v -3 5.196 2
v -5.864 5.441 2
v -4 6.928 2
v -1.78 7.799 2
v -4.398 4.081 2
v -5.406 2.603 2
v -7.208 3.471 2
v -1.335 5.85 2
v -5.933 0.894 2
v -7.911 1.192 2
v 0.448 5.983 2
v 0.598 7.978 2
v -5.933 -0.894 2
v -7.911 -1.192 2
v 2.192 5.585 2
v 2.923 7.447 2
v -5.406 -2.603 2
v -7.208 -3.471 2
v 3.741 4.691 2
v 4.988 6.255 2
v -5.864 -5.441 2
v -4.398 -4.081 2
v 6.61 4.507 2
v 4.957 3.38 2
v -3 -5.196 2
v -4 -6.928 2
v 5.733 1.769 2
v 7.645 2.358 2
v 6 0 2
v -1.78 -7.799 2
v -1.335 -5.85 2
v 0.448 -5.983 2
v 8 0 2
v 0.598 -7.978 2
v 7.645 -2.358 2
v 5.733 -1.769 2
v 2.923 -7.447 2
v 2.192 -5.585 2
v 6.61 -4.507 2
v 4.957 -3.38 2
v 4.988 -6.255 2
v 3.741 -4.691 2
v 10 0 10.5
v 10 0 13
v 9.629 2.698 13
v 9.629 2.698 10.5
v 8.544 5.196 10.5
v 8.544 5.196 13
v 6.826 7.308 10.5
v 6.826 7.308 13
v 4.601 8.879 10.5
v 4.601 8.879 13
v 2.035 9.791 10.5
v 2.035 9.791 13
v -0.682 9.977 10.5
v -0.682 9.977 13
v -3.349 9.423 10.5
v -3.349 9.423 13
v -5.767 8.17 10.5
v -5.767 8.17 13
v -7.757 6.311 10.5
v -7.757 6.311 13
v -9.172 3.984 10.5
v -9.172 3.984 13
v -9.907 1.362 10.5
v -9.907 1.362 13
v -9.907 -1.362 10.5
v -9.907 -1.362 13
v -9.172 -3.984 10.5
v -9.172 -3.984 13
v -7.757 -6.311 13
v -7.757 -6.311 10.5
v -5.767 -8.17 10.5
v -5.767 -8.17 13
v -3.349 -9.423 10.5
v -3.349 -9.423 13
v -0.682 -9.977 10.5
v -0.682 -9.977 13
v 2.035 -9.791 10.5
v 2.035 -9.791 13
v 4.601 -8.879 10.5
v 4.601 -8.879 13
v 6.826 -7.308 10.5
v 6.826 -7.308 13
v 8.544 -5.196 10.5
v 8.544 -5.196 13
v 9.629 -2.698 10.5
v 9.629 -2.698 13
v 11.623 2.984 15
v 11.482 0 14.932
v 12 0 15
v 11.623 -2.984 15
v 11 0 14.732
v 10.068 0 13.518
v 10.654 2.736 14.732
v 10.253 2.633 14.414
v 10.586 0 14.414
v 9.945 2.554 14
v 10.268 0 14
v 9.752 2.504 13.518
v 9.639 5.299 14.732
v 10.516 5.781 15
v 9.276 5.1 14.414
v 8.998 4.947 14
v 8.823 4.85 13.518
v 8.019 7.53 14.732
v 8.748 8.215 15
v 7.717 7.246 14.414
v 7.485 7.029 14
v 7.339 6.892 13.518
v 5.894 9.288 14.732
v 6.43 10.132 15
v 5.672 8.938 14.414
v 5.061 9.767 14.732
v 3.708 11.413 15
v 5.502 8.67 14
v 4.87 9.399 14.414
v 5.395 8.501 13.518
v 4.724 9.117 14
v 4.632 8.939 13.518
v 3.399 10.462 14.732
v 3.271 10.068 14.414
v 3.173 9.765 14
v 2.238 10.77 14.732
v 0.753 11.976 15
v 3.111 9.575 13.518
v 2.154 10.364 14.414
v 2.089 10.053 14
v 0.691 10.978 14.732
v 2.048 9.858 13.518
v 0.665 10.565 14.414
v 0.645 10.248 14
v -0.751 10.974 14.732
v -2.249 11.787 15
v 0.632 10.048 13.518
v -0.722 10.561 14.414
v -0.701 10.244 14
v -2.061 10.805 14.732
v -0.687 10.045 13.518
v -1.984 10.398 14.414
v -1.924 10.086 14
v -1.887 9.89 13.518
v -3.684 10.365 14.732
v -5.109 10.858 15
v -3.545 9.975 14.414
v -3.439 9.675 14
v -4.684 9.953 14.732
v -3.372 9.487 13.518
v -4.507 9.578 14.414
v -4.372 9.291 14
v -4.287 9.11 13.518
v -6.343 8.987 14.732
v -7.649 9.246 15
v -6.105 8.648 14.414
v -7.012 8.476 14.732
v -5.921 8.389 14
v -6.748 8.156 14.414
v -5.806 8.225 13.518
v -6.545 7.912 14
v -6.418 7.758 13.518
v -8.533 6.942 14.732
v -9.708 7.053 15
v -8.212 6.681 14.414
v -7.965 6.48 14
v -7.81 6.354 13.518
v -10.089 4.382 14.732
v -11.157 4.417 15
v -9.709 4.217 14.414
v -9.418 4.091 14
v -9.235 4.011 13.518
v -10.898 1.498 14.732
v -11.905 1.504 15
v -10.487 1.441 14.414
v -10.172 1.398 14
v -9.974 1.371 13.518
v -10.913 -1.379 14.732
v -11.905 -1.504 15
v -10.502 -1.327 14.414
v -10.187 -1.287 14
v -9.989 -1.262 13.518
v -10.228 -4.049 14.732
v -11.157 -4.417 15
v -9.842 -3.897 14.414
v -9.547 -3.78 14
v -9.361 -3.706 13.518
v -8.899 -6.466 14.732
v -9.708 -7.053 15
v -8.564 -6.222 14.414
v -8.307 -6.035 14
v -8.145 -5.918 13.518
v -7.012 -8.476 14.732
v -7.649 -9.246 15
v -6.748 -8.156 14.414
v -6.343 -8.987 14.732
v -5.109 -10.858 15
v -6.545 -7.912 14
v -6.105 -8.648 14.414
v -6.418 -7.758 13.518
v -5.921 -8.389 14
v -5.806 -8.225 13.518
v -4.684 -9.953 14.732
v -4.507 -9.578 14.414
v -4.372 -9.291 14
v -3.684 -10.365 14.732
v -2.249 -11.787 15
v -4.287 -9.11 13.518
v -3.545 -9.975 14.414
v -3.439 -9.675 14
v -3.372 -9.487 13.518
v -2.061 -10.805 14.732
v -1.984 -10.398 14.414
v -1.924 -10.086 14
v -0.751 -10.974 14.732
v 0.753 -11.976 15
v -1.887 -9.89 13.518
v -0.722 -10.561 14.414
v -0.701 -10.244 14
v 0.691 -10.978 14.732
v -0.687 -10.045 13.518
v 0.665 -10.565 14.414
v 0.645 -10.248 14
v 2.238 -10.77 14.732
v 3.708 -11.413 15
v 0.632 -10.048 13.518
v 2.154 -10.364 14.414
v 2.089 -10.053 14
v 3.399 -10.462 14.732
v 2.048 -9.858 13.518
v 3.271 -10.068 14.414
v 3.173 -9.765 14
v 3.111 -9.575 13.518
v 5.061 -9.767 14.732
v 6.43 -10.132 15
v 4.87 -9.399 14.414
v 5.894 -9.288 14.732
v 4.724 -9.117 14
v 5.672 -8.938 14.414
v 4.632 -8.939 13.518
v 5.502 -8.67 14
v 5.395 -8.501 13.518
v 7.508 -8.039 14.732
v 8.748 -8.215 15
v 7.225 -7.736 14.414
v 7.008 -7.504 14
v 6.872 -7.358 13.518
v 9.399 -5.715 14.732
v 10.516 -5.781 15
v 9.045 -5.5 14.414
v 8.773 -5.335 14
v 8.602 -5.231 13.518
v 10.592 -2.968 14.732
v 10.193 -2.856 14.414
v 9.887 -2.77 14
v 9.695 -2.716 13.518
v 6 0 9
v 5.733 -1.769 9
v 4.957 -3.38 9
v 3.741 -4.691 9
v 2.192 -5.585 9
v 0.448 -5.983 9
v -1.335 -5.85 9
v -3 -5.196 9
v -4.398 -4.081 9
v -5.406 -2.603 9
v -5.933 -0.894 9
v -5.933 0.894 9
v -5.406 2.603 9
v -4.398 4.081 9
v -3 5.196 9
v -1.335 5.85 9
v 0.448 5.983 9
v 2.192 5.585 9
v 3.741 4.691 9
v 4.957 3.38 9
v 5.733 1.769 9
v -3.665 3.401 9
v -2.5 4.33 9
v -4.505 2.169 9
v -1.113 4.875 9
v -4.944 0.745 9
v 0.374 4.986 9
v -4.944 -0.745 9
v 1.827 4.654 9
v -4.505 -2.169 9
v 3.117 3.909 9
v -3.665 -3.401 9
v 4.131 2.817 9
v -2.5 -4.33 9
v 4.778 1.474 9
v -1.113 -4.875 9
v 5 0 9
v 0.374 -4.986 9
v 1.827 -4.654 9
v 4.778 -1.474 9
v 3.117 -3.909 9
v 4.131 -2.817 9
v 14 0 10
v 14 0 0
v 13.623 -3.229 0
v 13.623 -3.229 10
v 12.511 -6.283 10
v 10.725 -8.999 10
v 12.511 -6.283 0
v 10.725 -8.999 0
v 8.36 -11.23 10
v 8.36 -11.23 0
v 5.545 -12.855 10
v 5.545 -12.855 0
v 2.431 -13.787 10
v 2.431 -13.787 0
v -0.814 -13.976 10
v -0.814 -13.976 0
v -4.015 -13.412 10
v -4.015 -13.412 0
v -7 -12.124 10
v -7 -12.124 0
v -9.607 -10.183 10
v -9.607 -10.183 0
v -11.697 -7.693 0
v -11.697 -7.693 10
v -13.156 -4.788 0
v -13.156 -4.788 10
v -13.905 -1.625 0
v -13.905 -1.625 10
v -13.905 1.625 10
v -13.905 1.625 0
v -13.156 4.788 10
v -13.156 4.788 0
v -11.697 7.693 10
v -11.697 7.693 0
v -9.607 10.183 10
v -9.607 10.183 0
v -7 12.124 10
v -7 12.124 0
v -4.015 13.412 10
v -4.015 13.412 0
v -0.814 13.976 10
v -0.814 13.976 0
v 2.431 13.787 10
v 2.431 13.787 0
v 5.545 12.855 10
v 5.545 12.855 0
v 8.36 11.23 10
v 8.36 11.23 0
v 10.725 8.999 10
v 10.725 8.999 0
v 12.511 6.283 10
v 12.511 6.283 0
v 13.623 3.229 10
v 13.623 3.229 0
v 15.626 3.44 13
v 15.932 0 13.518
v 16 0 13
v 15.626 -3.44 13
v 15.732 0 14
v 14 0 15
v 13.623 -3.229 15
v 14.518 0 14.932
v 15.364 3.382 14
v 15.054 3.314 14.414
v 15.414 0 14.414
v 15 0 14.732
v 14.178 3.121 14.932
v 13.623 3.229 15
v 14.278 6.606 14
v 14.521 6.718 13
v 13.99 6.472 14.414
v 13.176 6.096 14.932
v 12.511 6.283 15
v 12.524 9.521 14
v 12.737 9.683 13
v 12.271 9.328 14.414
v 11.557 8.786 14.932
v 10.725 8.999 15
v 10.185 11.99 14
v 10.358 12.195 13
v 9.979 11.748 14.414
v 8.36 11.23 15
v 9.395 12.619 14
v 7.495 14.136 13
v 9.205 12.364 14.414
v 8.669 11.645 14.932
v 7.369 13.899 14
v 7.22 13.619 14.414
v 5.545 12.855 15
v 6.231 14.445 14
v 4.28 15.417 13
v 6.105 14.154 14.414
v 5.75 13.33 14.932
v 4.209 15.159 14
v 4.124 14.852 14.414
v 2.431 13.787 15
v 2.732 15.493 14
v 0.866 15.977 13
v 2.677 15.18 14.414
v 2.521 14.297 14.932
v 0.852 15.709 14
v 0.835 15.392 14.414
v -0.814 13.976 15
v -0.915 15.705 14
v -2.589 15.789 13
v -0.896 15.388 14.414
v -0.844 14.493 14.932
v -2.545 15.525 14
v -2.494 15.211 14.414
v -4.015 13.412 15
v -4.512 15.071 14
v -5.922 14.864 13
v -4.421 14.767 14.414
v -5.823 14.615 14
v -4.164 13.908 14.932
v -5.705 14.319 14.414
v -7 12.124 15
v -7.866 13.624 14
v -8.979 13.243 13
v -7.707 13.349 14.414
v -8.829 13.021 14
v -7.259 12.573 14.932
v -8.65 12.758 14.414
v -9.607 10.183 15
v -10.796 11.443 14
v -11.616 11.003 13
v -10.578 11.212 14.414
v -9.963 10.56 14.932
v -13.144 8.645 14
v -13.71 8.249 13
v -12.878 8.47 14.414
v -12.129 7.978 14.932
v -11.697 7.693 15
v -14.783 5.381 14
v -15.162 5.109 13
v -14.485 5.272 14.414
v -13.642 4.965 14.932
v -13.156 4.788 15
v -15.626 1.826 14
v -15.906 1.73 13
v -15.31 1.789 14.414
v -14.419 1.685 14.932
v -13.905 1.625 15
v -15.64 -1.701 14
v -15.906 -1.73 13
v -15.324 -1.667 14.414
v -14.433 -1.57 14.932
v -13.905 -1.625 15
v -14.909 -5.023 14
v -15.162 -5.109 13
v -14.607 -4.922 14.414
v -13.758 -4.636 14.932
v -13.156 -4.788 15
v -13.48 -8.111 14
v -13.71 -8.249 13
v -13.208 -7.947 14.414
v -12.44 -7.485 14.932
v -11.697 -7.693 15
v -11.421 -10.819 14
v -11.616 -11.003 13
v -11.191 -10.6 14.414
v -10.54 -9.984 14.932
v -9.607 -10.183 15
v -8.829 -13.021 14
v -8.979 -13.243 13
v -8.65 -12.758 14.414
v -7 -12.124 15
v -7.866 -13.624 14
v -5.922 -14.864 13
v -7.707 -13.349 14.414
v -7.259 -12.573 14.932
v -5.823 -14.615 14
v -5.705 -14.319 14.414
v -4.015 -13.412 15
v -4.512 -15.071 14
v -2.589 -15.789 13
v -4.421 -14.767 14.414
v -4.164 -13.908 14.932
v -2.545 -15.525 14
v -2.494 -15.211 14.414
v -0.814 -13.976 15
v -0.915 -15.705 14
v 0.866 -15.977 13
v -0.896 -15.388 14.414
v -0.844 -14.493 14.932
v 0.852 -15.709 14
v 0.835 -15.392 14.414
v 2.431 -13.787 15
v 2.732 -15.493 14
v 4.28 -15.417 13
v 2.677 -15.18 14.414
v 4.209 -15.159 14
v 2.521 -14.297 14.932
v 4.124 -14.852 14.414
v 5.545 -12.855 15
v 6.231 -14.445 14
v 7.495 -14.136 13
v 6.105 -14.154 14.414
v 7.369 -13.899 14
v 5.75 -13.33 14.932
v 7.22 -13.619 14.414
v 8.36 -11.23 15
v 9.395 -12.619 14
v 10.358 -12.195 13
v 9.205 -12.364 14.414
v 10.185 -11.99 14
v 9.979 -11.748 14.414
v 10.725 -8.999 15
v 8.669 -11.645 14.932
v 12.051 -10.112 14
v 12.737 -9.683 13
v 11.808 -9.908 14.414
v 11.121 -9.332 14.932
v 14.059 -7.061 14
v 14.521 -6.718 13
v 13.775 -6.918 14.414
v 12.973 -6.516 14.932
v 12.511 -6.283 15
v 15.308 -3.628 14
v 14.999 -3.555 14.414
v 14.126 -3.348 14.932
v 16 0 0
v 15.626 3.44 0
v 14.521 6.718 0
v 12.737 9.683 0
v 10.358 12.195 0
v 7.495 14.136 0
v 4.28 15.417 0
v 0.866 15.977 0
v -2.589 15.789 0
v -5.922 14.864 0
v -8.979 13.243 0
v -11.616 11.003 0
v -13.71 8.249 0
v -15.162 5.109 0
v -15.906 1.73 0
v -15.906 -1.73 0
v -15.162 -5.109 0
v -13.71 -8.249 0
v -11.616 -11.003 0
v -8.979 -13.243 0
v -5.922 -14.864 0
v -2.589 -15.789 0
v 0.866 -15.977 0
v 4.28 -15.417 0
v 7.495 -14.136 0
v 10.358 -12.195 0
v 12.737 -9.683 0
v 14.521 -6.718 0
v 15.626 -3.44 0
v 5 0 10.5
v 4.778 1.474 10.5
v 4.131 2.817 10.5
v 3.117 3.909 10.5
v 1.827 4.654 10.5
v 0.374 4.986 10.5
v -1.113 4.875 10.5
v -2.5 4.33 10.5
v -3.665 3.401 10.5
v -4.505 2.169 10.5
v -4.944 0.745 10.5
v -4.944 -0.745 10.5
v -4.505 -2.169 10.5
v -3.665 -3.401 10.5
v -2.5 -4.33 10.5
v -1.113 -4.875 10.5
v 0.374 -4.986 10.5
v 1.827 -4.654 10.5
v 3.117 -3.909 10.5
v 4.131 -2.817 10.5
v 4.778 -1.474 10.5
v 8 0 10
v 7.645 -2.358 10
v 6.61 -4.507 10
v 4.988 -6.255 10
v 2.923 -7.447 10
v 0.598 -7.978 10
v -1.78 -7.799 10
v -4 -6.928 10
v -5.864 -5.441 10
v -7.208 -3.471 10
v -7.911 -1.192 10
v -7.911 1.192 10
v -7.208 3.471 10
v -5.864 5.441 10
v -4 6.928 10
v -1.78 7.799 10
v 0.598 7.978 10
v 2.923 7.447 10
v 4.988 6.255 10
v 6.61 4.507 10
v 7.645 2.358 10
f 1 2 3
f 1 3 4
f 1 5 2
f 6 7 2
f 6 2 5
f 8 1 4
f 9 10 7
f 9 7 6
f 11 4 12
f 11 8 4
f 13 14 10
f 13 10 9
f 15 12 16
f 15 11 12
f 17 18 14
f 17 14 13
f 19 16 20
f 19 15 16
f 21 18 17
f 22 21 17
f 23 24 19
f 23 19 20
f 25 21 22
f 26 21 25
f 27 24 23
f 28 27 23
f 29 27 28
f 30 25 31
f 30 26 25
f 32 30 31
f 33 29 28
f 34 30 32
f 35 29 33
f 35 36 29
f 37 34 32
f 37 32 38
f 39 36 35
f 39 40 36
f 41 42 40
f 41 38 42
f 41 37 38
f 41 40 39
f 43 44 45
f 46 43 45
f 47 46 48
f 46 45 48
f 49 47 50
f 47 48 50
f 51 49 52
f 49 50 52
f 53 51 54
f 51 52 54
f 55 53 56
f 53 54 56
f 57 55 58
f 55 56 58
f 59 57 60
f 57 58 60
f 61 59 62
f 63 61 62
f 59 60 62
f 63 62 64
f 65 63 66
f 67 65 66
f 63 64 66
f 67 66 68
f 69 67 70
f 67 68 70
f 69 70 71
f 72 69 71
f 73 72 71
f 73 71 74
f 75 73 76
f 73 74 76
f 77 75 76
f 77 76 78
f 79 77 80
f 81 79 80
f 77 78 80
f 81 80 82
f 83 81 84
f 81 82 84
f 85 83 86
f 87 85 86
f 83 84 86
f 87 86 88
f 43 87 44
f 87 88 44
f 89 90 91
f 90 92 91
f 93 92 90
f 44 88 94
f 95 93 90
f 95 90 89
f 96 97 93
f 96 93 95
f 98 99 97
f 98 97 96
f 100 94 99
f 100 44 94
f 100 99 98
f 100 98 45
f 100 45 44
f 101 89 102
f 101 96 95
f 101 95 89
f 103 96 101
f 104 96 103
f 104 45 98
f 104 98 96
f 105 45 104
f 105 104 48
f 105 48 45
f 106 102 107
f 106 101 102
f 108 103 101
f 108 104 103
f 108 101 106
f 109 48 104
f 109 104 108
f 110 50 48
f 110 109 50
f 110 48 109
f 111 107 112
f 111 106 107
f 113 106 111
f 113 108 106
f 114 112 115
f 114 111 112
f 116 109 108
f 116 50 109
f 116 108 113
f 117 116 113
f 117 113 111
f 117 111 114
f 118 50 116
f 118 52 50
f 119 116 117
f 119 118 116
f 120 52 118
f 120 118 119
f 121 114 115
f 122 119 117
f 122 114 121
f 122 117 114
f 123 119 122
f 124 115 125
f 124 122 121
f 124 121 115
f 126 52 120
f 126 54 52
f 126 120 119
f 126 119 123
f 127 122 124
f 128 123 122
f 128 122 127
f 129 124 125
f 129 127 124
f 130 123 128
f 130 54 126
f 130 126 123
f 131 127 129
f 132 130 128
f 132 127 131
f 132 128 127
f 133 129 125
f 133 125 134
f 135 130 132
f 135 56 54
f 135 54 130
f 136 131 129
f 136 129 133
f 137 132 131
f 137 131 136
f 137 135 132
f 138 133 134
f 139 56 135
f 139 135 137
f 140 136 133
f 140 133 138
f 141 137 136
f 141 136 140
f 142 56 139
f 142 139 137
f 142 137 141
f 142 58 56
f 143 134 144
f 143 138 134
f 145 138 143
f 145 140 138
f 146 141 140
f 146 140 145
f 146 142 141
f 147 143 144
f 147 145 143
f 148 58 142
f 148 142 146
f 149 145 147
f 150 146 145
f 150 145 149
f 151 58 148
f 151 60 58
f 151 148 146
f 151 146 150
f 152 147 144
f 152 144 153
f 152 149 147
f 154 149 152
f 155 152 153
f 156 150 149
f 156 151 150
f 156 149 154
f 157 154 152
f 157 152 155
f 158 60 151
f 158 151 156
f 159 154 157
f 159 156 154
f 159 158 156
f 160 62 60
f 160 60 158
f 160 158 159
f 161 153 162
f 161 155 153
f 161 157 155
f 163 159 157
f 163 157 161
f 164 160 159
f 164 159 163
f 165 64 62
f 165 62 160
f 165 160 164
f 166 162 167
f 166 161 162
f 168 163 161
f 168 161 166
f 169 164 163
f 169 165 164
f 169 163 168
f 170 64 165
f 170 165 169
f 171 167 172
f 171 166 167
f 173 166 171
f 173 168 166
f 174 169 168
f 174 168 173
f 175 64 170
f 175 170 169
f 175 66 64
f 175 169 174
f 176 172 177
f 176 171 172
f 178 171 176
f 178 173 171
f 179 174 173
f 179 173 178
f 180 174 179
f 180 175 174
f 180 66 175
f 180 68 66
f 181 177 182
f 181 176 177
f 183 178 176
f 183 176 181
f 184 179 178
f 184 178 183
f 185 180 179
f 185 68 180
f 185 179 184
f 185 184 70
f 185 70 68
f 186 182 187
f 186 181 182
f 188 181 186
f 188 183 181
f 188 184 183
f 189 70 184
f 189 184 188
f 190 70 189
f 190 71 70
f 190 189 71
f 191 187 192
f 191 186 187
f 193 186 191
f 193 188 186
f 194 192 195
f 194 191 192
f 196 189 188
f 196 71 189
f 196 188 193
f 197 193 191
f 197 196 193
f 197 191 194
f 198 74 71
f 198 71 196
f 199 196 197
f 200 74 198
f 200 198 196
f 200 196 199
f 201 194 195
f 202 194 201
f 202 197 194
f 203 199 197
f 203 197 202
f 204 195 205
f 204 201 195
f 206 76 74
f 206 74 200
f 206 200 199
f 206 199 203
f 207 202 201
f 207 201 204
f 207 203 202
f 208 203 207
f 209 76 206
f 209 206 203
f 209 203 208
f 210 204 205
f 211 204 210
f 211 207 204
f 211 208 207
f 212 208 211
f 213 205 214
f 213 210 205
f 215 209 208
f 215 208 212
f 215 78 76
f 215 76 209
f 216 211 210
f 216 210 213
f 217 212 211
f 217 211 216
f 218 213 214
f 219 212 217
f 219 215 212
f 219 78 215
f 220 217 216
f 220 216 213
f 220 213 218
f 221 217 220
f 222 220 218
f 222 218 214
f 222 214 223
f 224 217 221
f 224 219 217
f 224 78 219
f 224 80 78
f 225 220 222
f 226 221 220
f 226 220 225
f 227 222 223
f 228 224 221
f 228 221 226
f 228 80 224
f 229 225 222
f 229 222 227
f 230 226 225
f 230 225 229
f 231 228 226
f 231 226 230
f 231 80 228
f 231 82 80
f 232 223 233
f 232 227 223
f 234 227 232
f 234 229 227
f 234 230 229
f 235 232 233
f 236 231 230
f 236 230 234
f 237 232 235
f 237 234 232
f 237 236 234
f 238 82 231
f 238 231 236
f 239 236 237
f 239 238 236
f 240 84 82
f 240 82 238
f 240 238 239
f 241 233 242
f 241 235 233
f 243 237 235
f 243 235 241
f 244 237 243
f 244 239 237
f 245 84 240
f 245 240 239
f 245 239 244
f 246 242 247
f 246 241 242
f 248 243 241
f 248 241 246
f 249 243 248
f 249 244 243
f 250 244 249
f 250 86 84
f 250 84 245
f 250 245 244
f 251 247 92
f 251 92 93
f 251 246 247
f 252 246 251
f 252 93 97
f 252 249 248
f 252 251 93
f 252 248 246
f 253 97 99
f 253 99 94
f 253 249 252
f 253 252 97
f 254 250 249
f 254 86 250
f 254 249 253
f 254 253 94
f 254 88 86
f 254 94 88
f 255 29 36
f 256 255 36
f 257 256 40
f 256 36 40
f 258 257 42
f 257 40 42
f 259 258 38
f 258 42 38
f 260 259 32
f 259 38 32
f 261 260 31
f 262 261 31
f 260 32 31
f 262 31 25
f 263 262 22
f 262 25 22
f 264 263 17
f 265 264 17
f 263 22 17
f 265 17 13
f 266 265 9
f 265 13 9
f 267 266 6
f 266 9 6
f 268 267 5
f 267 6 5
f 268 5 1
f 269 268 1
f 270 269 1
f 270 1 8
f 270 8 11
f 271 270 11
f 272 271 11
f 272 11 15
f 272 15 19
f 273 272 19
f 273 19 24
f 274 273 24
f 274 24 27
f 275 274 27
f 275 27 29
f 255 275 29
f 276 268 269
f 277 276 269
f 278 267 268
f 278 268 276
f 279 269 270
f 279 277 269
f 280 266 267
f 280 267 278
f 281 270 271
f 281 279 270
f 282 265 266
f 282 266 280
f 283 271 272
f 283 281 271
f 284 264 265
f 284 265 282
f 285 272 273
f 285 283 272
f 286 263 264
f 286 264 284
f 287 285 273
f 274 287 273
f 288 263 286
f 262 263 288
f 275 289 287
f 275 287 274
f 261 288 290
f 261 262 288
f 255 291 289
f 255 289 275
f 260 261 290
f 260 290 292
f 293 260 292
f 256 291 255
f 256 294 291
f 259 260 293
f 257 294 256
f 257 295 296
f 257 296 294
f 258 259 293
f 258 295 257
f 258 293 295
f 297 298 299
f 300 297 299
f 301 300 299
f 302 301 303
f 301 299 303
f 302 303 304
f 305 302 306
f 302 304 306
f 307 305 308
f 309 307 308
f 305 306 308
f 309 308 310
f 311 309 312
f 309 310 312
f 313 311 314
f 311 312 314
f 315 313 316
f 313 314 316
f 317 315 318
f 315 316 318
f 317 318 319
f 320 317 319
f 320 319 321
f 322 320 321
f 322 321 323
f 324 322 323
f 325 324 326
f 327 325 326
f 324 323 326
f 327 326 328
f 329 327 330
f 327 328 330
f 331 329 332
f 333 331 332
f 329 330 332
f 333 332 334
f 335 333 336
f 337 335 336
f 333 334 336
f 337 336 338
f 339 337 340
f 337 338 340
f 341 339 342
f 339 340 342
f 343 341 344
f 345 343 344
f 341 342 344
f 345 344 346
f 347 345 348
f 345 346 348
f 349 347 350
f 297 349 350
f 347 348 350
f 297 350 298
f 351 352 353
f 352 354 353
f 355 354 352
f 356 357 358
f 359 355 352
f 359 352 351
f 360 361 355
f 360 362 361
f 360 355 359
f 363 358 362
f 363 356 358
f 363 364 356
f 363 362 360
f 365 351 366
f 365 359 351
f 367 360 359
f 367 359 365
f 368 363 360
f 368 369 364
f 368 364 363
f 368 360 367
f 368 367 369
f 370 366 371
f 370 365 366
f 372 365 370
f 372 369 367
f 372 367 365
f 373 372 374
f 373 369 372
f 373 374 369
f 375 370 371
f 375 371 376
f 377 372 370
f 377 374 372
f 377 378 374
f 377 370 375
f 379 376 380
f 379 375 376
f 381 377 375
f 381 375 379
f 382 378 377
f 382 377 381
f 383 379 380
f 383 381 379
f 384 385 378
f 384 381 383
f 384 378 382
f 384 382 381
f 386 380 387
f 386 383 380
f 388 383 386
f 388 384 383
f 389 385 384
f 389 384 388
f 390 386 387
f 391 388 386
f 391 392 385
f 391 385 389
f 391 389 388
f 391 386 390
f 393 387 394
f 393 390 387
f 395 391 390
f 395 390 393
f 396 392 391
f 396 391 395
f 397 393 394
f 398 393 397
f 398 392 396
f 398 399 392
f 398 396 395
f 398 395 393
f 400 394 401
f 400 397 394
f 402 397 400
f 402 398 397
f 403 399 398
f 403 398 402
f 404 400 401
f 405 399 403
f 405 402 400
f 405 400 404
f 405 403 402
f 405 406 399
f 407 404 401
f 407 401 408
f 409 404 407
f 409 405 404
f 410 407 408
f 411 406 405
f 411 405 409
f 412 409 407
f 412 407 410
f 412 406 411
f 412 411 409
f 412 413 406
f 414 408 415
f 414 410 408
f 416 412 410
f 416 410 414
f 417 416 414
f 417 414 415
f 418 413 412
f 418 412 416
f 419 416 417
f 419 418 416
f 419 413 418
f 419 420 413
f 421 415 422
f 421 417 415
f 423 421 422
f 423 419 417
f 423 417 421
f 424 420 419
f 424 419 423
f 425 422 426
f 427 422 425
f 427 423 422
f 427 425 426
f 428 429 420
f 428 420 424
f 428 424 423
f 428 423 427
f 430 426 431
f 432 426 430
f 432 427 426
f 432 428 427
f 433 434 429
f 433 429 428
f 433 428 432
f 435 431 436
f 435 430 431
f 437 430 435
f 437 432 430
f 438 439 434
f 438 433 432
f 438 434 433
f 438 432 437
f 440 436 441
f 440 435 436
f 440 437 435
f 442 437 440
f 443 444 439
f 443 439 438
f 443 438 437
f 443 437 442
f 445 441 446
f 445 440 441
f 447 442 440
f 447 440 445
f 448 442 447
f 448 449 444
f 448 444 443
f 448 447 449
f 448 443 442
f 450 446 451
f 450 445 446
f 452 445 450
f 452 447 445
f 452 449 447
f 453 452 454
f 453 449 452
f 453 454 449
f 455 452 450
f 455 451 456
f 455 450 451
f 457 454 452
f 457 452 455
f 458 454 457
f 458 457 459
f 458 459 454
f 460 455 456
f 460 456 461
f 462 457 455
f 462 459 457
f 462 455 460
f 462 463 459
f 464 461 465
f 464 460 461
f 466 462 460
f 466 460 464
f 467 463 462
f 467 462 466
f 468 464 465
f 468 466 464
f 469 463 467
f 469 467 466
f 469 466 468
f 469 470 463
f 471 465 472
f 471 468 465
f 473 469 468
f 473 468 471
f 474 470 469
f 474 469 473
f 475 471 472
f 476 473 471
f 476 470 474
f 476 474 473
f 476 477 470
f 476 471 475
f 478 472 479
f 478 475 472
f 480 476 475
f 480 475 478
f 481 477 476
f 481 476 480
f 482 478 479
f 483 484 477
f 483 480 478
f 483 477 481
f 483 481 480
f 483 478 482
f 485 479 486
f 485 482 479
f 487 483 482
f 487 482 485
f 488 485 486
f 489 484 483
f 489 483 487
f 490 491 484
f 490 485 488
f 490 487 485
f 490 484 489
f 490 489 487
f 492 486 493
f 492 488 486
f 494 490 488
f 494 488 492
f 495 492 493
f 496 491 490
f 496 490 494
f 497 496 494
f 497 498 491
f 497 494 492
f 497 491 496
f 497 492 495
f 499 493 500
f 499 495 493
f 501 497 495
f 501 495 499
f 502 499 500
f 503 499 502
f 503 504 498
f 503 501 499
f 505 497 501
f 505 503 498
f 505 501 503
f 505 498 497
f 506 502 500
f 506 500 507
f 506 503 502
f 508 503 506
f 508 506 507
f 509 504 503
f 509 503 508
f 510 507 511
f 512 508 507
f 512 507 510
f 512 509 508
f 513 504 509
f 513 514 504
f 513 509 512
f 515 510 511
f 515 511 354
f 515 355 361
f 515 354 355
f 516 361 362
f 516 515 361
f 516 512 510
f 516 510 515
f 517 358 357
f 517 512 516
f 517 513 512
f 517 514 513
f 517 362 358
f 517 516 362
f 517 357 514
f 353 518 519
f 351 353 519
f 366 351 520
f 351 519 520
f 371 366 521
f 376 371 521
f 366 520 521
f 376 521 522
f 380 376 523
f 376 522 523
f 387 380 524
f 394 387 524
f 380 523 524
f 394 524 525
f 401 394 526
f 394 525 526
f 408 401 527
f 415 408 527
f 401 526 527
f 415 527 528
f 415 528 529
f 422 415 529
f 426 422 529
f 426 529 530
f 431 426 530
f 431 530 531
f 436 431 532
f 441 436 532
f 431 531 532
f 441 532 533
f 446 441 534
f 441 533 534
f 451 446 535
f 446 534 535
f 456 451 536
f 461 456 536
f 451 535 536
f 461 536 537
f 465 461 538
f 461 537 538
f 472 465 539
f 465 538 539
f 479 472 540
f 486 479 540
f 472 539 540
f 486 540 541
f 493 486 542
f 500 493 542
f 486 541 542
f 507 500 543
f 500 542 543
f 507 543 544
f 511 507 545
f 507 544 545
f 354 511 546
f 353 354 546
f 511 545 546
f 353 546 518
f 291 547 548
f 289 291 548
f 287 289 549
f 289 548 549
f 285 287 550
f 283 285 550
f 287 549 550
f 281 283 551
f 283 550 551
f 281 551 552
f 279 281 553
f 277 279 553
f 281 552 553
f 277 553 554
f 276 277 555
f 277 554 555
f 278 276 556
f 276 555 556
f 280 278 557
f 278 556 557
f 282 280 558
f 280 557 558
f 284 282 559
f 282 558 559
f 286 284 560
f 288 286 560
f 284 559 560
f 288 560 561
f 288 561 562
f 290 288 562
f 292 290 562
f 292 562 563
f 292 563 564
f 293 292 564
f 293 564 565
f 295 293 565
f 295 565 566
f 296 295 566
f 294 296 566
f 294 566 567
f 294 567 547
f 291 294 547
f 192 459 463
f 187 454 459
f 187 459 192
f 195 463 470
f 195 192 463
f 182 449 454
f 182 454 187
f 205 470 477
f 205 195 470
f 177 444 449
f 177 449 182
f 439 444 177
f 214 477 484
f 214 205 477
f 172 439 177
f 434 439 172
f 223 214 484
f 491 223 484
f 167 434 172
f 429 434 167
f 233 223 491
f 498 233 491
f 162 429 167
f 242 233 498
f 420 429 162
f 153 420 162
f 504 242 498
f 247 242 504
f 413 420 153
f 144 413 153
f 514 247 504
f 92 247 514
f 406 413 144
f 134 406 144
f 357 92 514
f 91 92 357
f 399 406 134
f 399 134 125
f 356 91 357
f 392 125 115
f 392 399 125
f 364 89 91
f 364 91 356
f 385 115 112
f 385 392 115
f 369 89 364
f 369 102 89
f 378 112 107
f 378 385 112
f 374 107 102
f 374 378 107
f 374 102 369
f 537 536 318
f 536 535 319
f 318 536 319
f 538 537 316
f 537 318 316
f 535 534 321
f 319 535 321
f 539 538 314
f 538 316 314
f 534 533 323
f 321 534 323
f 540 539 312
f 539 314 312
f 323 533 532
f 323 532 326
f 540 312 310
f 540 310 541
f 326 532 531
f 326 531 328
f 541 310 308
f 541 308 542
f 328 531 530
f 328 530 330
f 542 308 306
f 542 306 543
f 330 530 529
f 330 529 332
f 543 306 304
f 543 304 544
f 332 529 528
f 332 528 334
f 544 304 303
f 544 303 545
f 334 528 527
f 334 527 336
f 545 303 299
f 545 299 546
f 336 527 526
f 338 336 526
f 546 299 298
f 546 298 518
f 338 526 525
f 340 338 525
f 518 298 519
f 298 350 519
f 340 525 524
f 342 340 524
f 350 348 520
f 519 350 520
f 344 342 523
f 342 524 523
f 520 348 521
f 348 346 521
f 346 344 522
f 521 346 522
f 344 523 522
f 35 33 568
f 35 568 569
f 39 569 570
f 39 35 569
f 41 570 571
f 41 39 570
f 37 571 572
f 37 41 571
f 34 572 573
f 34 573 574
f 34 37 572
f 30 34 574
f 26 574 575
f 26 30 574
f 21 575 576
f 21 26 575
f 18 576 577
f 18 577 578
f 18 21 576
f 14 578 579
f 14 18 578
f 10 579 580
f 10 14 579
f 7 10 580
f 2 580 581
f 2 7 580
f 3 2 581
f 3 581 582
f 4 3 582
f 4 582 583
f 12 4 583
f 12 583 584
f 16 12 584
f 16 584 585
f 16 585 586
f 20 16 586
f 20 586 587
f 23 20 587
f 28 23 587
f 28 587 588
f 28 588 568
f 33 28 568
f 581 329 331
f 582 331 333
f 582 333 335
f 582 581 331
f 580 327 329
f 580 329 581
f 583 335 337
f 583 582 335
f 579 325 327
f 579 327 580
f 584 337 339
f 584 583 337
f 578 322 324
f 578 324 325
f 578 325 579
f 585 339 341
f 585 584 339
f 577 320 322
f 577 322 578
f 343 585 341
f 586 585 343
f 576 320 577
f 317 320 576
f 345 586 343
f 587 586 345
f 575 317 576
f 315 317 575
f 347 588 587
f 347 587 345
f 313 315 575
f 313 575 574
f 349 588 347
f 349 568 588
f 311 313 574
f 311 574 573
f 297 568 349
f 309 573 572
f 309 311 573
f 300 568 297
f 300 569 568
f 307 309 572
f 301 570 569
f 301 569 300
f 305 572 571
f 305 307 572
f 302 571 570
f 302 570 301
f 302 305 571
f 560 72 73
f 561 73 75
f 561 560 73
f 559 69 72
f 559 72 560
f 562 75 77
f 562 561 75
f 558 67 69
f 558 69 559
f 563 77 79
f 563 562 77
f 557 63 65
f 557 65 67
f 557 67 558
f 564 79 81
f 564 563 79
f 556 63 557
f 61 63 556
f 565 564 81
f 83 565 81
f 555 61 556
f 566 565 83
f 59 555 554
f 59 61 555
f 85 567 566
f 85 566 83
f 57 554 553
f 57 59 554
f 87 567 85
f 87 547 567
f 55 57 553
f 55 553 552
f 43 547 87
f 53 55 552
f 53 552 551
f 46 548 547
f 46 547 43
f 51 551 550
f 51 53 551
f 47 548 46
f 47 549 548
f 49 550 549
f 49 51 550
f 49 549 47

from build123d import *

# Parameters (mm, degrees)
F0_R      = 16
F1_DEPTH  = 15
F2_R      = 10
F3_DEPTH  = 4.5
F4_R      = 14
F4_R_2    = 8
F5_DEPTH  = 10
F6_R      = 6
F7_DEPTH  = 9
F8_R      = 5
F9_DEPTH  = 25
F10_R     = 8
F10_R_2   = 6
F11_DEPTH = 2
F12_R     = 2


with BuildPart() as f1:
    # F0 (on Top) → F1 (new body)
    with BuildSketch(Plane.XY):
        Circle(F0_R)
    extrude(amount=F1_DEPTH)

    # F2 (on face) → F3 (cut)
    with BuildSketch(Plane.XY.offset(15)):
        Circle(F2_R)
    extrude(amount=-F3_DEPTH, mode=Mode.SUBTRACT)

    # F4 (on face) → F5 (cut)
    with BuildSketch(Plane(origin=(0, 0, 0), x_dir=(1, 0, 0), z_dir=(0, 0, -1))):
        Circle(F4_R)
        Circle(F4_R_2, mode=Mode.SUBTRACT)
    extrude(amount=-F5_DEPTH, mode=Mode.SUBTRACT)

    # F6 (on face) → F7 (cut)
    with BuildSketch(Plane(origin=(0, 0, 0), x_dir=(1, 0, 0), z_dir=(0, 0, -1))):
        Circle(F6_R)
    extrude(amount=-F7_DEPTH, mode=Mode.SUBTRACT)

    # F8 (on face) → F9 (cut)
    with BuildSketch(Plane.XY.offset(10.5)):
        Circle(F8_R)
    extrude(amount=-F9_DEPTH, mode=Mode.SUBTRACT)

    # F10 (on face) → F11 (cut)
    with BuildSketch(Plane(origin=(0, 0, 0), x_dir=(1, 0, 0), z_dir=(0, 0, -1))):
        Circle(F10_R)
        Circle(F10_R_2, mode=Mode.SUBTRACT)
    extrude(amount=-F11_DEPTH, mode=Mode.SUBTRACT)

    # F12
    f12_edges = [f1.edges().sort_by_distance(p)[0] for p in [
        (-16, 0, 15),
        (-10, 0, 15),
    ]]
    fillet(f12_edges, radius=F12_R)


solid = f1.part
